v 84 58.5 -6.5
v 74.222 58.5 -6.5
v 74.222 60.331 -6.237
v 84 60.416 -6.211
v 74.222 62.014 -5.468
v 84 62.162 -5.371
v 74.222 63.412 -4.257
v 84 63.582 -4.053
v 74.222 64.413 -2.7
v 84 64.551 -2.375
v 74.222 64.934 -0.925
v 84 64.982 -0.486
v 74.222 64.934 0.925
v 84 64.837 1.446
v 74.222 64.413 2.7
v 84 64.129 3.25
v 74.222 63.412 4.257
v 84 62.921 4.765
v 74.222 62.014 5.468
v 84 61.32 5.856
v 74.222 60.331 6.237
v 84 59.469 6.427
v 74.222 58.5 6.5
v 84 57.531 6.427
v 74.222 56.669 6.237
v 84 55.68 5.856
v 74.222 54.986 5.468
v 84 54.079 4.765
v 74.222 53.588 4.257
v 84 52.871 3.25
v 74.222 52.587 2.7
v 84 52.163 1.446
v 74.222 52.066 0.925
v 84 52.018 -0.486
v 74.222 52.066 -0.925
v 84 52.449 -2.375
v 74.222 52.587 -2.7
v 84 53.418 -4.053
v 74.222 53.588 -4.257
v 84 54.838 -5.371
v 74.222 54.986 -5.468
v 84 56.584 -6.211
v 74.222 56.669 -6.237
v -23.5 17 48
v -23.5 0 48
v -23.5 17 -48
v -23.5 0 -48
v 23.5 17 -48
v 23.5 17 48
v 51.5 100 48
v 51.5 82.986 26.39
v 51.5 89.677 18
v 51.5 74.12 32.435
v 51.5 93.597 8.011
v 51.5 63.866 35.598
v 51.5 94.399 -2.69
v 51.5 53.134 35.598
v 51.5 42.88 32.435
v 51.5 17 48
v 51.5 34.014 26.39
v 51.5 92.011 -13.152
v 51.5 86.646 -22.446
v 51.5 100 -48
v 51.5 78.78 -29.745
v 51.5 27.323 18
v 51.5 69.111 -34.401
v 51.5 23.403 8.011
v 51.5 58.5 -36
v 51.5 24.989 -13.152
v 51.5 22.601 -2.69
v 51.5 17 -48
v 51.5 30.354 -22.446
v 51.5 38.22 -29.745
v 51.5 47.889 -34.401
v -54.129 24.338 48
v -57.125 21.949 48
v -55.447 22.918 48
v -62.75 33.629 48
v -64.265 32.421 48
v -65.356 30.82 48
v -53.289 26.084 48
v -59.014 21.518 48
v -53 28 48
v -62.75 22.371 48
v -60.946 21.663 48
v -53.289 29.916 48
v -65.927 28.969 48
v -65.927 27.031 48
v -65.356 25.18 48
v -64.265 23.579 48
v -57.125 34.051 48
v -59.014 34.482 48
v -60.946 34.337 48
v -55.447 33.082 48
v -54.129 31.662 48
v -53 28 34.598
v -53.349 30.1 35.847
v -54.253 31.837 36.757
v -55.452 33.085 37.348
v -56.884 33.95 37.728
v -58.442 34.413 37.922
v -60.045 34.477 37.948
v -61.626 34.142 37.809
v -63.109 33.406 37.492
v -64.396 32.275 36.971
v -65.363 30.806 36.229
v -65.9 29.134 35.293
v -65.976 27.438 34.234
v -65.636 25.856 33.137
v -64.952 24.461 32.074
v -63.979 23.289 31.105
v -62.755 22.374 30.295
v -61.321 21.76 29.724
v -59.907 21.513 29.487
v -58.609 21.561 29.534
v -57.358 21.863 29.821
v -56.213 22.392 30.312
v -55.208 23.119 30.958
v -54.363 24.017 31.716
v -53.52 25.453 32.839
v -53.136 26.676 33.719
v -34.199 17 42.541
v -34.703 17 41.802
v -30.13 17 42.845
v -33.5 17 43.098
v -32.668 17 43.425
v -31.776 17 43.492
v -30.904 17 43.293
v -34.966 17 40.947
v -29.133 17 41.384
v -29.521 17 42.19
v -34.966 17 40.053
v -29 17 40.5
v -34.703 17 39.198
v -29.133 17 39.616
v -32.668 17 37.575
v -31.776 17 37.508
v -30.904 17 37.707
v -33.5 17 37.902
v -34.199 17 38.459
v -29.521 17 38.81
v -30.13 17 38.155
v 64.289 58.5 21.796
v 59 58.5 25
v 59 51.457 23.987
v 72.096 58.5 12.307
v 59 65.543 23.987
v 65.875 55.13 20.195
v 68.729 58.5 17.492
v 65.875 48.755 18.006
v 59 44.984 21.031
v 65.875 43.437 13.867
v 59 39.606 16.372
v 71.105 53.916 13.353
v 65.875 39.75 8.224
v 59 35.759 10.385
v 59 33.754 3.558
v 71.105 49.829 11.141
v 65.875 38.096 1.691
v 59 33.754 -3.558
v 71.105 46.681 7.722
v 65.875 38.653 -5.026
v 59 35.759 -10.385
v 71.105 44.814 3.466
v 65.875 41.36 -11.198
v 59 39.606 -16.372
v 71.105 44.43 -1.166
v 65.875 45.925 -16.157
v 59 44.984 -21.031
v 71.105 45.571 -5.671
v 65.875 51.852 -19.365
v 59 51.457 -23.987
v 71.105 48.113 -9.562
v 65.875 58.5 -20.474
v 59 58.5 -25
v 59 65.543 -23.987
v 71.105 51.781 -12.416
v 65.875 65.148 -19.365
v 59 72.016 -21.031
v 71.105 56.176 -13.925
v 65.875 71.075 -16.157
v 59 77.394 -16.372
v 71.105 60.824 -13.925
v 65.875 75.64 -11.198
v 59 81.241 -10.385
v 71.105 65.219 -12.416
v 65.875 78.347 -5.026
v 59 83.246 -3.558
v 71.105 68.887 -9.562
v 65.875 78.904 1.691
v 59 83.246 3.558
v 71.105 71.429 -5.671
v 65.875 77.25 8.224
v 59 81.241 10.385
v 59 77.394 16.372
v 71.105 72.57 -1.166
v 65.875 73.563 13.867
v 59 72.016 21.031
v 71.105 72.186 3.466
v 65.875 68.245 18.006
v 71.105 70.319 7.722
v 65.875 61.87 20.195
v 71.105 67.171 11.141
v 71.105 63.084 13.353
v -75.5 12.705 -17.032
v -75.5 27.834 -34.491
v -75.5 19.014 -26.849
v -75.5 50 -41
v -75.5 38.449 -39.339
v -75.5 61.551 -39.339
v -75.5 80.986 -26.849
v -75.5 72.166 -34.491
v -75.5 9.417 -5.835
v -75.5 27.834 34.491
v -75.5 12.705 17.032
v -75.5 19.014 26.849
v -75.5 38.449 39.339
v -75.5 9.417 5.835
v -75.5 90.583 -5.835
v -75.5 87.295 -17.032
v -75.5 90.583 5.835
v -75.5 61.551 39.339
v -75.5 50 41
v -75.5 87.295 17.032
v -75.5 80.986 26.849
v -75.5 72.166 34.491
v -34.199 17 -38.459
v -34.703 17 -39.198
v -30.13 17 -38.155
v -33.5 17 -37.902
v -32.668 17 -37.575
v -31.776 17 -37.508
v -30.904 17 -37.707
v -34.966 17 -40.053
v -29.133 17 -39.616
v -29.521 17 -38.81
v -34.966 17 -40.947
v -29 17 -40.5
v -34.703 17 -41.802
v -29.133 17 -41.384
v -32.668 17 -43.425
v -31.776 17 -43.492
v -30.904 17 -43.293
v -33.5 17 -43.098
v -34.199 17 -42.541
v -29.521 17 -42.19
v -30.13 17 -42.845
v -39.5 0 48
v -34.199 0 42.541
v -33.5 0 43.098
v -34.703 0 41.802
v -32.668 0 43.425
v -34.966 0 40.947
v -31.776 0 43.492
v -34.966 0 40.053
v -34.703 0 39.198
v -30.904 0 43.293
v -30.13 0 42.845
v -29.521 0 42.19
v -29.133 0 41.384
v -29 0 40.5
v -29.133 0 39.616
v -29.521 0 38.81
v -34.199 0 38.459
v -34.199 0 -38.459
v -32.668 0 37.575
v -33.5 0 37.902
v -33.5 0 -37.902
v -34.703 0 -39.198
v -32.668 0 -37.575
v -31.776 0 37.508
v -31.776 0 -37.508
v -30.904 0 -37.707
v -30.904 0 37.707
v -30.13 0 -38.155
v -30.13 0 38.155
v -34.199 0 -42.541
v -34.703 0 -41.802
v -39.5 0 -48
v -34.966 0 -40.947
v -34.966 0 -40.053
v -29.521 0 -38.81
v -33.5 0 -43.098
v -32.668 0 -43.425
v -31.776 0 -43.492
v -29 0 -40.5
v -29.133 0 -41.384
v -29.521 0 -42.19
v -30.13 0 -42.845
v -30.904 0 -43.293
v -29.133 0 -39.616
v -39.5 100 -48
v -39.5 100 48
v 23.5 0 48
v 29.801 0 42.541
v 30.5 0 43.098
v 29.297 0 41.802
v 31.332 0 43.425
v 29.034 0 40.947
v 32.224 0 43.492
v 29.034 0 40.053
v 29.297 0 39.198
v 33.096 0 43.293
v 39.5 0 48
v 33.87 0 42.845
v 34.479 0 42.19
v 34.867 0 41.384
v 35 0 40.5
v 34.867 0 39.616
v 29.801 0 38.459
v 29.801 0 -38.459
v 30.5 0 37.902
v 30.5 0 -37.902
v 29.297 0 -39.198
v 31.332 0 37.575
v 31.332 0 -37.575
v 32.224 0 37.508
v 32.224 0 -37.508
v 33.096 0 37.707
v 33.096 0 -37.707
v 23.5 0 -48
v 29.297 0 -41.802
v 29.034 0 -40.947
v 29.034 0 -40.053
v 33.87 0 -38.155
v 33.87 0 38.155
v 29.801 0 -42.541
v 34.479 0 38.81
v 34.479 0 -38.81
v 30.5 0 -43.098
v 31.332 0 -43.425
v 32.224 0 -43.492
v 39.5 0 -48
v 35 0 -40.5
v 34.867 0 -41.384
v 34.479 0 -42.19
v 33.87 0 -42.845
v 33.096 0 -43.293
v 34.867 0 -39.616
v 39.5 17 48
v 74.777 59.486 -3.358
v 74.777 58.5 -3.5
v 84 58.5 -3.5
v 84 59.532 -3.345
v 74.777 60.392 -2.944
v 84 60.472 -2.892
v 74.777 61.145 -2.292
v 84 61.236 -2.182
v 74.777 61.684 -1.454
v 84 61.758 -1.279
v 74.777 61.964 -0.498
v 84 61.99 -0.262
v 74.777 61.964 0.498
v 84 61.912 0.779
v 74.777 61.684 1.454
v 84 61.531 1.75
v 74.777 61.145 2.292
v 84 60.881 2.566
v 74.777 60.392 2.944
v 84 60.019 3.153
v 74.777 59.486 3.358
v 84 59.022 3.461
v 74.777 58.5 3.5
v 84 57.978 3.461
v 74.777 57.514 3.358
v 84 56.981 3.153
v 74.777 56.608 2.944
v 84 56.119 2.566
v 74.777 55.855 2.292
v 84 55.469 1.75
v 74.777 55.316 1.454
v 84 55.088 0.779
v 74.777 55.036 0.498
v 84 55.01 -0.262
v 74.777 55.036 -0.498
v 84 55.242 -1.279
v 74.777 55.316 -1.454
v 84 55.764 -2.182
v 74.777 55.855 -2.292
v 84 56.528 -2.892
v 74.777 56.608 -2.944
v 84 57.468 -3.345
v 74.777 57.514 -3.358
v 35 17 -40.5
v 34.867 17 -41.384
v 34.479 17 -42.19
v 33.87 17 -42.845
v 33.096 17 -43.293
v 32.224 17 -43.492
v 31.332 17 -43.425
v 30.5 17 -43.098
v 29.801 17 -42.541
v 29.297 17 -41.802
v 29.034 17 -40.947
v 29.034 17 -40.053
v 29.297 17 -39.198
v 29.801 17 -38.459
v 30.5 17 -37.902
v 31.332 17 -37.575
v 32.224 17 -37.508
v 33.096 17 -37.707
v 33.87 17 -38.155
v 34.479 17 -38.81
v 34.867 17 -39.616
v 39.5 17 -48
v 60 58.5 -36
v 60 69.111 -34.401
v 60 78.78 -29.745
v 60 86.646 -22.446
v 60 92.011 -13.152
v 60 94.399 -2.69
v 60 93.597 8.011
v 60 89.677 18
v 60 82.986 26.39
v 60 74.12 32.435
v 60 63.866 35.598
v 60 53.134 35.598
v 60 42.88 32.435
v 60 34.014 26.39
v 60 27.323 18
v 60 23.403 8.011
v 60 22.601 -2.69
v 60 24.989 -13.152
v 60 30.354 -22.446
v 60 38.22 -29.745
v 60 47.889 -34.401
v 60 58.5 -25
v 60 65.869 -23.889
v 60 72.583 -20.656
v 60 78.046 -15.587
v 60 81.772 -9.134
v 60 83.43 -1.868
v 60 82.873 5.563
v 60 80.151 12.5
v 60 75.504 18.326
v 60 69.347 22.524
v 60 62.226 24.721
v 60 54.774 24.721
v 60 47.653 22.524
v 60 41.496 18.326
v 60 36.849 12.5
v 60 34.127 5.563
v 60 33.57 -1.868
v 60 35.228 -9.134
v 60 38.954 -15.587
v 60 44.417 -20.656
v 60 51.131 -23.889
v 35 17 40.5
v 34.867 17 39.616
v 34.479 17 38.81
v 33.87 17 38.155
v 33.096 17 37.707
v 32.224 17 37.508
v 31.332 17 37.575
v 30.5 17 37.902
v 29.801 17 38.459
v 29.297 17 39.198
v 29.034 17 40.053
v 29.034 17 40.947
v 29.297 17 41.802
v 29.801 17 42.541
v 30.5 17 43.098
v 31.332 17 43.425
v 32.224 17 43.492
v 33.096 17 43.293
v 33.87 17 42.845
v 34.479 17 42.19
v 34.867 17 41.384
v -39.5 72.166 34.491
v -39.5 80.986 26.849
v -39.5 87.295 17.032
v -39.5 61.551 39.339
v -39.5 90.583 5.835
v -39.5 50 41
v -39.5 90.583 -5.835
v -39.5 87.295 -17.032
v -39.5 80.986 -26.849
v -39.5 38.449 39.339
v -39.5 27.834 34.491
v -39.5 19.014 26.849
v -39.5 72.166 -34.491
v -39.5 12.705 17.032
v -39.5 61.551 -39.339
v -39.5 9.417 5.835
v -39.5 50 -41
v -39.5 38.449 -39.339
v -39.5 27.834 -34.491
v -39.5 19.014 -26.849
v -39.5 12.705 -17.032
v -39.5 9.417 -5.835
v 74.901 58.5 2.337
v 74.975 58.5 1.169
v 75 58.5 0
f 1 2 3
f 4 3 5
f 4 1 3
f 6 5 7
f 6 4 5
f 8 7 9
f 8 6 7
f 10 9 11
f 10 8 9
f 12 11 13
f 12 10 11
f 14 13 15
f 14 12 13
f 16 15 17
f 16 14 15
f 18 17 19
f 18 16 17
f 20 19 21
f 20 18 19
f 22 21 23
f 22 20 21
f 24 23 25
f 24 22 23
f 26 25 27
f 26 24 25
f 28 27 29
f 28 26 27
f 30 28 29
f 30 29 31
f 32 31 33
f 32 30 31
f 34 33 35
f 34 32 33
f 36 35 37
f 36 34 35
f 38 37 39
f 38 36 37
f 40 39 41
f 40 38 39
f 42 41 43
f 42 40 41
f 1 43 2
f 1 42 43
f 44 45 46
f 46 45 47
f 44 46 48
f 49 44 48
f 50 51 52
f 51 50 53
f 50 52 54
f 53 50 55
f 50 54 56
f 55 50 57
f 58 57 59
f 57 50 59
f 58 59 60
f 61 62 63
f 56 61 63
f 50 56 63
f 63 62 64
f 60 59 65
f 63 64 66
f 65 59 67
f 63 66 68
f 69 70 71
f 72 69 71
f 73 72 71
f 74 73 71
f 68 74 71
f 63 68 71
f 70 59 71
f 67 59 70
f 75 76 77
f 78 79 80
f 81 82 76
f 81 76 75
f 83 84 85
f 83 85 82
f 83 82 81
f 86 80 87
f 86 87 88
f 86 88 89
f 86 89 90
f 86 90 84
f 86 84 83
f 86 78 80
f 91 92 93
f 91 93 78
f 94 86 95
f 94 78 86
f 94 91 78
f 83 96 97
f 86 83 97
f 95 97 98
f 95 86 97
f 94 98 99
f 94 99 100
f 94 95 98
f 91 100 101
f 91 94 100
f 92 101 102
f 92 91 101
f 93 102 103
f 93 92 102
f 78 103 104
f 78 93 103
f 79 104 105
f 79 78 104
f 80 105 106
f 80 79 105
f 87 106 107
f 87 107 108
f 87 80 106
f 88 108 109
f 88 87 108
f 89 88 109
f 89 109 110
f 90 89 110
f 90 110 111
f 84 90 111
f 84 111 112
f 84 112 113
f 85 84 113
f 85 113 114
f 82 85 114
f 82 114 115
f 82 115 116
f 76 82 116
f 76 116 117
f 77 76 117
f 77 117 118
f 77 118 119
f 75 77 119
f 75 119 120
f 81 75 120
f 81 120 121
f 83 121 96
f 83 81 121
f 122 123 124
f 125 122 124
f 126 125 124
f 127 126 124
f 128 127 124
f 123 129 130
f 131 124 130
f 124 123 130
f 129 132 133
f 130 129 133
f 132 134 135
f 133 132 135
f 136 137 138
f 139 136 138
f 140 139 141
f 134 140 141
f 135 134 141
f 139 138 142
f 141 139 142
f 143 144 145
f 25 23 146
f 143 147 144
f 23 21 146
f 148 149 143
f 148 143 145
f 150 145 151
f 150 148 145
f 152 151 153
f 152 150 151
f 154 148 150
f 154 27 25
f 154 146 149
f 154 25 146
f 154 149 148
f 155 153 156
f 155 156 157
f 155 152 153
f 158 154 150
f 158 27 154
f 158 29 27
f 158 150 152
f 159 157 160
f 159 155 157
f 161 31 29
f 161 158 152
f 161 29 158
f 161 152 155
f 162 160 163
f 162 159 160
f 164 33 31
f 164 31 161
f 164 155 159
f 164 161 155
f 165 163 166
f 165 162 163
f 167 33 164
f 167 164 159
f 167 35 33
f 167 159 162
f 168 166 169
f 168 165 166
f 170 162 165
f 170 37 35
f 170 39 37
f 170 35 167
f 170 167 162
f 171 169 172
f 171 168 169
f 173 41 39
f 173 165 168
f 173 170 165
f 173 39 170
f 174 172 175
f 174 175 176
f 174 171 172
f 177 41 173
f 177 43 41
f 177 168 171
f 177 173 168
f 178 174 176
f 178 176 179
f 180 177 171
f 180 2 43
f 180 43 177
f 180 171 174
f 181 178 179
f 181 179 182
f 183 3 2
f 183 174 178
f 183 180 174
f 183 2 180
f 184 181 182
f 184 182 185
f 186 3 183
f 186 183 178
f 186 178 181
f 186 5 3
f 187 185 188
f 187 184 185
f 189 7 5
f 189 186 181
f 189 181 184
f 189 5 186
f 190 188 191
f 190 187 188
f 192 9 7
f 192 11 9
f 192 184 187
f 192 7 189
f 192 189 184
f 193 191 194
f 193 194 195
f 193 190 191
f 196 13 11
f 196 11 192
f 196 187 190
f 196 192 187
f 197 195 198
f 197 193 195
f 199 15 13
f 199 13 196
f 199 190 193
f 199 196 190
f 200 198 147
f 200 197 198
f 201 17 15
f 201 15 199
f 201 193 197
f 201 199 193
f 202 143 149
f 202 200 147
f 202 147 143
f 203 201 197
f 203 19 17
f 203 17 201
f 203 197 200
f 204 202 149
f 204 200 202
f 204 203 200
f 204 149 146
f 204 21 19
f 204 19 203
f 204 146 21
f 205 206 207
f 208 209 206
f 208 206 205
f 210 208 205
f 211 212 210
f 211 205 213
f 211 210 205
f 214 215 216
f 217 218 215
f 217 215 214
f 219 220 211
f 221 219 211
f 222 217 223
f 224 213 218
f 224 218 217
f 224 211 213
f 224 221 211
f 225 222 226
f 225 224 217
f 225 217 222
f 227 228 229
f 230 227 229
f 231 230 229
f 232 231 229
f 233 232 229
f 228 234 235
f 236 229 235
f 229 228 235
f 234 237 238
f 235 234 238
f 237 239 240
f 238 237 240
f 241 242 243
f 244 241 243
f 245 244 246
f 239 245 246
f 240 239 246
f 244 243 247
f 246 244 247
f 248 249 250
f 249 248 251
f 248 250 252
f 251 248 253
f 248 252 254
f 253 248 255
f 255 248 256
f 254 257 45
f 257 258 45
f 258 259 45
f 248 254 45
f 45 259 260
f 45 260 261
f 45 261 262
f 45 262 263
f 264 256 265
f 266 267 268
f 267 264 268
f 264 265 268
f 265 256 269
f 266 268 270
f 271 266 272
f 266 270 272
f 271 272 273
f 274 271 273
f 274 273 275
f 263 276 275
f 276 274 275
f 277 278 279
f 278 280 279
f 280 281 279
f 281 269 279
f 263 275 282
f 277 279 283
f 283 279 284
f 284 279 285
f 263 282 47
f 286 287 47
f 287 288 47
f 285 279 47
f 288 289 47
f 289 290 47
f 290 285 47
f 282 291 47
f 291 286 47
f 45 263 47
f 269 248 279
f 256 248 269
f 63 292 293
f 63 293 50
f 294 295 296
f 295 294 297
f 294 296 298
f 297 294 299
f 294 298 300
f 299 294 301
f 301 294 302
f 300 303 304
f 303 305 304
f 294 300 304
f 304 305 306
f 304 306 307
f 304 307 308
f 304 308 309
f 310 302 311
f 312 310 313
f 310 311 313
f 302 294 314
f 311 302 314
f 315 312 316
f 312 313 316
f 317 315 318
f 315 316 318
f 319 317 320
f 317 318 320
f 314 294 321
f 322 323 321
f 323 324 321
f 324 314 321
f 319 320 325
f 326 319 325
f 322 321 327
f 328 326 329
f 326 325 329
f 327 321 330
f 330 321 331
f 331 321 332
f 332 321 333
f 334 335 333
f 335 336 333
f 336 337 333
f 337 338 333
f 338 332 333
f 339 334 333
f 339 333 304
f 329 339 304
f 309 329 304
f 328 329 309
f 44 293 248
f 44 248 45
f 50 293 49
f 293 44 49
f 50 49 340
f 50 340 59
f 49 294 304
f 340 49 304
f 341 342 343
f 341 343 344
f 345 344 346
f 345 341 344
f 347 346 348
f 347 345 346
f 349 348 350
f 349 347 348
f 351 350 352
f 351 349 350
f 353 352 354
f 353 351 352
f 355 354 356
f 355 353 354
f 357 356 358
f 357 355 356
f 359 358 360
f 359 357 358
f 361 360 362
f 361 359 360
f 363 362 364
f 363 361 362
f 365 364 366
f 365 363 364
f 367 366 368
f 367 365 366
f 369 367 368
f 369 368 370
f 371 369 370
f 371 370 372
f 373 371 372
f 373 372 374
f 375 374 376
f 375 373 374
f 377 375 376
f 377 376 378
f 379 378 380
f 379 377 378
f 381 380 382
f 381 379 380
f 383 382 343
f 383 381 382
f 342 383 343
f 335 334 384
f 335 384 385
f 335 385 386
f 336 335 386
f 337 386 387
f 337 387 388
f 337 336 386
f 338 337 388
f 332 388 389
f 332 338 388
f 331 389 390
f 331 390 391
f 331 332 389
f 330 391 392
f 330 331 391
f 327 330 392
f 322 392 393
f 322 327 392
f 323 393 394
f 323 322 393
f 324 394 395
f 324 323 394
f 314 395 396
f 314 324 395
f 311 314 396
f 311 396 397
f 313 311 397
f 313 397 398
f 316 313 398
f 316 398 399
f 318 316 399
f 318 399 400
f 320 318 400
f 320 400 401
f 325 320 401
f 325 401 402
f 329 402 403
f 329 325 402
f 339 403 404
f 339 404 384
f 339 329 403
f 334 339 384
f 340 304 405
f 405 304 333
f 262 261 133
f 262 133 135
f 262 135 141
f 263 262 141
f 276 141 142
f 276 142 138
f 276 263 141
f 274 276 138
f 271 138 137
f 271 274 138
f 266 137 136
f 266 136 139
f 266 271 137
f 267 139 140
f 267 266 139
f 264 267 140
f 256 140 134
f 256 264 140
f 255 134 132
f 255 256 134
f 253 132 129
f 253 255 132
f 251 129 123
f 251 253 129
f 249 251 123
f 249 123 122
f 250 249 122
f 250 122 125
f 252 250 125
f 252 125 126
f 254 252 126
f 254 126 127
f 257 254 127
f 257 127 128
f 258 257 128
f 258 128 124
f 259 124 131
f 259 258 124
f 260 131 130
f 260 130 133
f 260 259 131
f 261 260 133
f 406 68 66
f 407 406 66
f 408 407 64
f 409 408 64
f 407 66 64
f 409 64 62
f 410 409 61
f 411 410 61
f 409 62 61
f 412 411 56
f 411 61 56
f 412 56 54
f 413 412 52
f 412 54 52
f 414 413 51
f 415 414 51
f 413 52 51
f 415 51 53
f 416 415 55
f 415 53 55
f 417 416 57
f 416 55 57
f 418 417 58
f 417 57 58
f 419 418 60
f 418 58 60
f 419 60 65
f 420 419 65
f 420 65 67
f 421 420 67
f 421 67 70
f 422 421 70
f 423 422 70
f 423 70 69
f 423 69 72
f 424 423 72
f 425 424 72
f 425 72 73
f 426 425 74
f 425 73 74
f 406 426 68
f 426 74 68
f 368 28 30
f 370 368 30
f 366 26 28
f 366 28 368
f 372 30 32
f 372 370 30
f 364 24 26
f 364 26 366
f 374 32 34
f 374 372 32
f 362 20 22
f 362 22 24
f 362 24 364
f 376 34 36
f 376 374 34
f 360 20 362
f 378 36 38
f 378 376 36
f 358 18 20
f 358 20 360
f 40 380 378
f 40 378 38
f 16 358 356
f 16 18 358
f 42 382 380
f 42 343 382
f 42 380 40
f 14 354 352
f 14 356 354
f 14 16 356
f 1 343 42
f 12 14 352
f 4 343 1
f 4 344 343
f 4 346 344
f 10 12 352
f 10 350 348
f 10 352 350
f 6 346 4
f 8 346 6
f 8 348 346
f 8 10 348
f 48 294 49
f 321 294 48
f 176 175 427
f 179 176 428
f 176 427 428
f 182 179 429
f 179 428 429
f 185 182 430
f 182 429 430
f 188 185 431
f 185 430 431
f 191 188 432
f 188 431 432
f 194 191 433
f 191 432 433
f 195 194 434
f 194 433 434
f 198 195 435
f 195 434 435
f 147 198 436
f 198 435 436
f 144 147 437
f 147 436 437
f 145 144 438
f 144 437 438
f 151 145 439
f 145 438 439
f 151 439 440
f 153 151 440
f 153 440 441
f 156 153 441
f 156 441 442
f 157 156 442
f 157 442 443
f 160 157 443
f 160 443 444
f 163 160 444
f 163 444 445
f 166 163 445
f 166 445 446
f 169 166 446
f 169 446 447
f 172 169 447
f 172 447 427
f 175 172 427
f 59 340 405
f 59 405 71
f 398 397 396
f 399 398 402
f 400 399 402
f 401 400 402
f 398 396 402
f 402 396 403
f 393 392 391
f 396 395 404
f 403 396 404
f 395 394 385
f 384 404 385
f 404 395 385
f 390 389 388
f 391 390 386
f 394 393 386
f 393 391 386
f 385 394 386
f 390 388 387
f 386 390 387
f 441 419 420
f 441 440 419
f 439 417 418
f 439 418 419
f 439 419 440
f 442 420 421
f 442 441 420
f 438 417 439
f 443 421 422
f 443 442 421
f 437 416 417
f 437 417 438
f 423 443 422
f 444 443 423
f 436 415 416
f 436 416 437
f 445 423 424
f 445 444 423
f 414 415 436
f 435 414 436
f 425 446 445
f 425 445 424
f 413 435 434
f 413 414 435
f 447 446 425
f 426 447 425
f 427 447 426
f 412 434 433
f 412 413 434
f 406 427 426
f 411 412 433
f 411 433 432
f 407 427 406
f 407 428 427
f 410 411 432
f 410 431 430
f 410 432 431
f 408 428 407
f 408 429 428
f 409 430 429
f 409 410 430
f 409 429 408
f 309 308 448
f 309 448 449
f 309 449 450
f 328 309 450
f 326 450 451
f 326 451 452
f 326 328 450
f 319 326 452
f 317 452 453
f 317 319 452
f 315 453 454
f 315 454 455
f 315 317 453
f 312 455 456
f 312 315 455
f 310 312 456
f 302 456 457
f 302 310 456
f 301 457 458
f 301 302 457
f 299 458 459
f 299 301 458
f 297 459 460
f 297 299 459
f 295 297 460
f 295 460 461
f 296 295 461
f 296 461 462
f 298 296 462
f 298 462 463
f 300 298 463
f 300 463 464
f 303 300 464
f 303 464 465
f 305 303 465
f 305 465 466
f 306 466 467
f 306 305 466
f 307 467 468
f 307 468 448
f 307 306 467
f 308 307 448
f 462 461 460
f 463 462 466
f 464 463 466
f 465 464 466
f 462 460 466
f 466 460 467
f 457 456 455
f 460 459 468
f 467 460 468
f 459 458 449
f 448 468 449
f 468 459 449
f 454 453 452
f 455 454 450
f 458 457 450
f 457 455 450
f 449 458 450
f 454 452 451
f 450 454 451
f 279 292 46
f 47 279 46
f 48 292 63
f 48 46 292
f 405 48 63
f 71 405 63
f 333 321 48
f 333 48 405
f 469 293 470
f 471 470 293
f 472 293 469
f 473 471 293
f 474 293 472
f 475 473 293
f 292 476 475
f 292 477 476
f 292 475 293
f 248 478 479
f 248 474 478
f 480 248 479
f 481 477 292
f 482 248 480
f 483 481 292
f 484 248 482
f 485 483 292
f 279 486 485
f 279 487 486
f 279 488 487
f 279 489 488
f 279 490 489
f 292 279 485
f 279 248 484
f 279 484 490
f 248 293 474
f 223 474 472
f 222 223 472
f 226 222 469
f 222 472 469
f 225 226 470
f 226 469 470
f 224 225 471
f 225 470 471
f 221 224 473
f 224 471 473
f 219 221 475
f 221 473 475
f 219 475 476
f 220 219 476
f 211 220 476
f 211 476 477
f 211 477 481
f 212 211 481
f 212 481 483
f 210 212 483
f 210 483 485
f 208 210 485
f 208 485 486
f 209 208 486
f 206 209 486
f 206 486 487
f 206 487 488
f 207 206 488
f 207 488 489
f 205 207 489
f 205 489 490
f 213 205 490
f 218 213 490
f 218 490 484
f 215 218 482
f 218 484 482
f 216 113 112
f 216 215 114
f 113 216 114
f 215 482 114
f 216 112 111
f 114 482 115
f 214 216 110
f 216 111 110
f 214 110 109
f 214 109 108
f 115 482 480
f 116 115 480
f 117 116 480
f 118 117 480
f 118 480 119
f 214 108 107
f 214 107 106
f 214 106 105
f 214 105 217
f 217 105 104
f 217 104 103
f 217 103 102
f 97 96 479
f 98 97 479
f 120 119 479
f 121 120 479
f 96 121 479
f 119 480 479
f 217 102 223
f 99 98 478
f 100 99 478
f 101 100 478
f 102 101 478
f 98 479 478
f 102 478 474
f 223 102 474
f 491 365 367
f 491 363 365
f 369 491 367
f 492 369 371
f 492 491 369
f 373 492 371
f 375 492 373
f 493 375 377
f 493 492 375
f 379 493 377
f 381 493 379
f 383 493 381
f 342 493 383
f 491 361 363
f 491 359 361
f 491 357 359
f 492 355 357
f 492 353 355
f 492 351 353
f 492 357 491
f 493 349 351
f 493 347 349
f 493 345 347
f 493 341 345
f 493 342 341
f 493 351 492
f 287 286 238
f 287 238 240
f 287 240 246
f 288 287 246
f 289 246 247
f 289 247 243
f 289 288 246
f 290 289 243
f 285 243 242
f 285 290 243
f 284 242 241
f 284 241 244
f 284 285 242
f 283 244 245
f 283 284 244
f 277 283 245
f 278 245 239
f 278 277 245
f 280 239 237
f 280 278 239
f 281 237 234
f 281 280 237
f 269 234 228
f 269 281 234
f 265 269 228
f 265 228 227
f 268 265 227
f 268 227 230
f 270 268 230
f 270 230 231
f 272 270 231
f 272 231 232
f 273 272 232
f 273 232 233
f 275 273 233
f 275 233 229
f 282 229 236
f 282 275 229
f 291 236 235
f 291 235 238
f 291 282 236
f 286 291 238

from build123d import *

# Parameters (mm, degrees)
SKETCH1_W             = 16
SKETCH1_H             = 96
SKETCH1_R             = 3
BOSS_EXTRUDE1_DEPTH   = 17
BOSS_EXTRUDE1_2_DEPTH = 17
SKETCH2_W             = 91
SKETCH2_H             = 96
BOSS_EXTRUDE2_DEPTH   = 83
SKETCH3_R             = 41
BOSS_EXTRUDE3_DEPTH   = 36
BOSS_EXTRUDE4_REACH   = 98
SKETCH4_R             = 6.5
SKETCH5_R             = 36
BOSS_EXTRUDE5_DEPTH   = 8.5
SKETCH6_R             = 25
CUT_EXTRUDE1_DEPTH    = 1
DOME1_FACE_RADIUS     = 25
DOME1_HEIGHT          = 16
SKETCH7_R             = 6.5
SKETCH7_R_2           = 3.5
BOSS_EXTRUDE6_DEPTH   = 9


with BuildPart() as part:
    # Sketch1 → Boss-Extrude1 (new body)
    with BuildSketch(Plane(origin=(0, 0, 0), x_dir=(1, 0, 0), z_dir=(0, 1, 0))):
        with Locations((-31.5, 0)):
            Rectangle(SKETCH1_W, SKETCH1_H)
        with Locations((-32, 40.5)):
            Circle(SKETCH1_R, mode=Mode.SUBTRACT)
        with Locations((-32, -40.5)):
            Circle(SKETCH1_R, mode=Mode.SUBTRACT)
    extrude(amount=BOSS_EXTRUDE1_DEPTH)



with BuildPart() as body_2:
    # Sketch1 → Boss-Extrude1 2 (new body)
    with BuildSketch(Plane(origin=(0, 0, 0), x_dir=(1, 0, 0), z_dir=(0, 1, 0))):
        with Locations((31.5, 0)):
            Rectangle(SKETCH1_W, SKETCH1_H)
        with Locations((32, 40.5)):
            Circle(SKETCH1_R, mode=Mode.SUBTRACT)
        with Locations((32, -40.5)):
            Circle(SKETCH1_R, mode=Mode.SUBTRACT)
    extrude(amount=BOSS_EXTRUDE1_2_DEPTH)


with BuildPart() as part_1:
    add(part.part)

    add(body_2.part)  # Boss-Extrude2 merges body 2
    # Sketch2 → Boss-Extrude2 (add)
    with BuildSketch(Plane(origin=(0, 17, 0), x_dir=(1, 0, 0), z_dir=(0, 1, 0))):
        with Locations((6, 0)):
            Rectangle(SKETCH2_W, SKETCH2_H)
    extrude(amount=BOSS_EXTRUDE2_DEPTH)

    # Sketch3 → Boss-Extrude3 (add)
    with BuildSketch(Plane.ZY.offset(39.5)):
        with Locations((0, 50)):
            Circle(SKETCH3_R)
    extrude(amount=BOSS_EXTRUDE3_DEPTH)

    # Sketch4 → Boss-Extrude4 (add, up to next)
    with BuildSketch(Plane.XY.offset(48), mode=Mode.PRIVATE) as boss_extrude4_sk1:
        with Locations((-59.5, 28)):
            Circle(SKETCH4_R)
    boss_extrude4_tool1 = extrude(boss_extrude4_sk1.sketch, amount=-BOSS_EXTRUDE4_REACH, mode=Mode.PRIVATE) - part_1.part
    add(boss_extrude4_tool1.solids().sort_by_distance((-59.5, 28, 48))[0])

    # Sketch5 → Boss-Extrude5 (add)
    with BuildSketch(Plane(origin=(51.5, 0, 0), x_dir=(0, 0, -1), z_dir=(1, 0, 0))):
        with Locations((0, 58.5)):
            Circle(SKETCH5_R)
    extrude(amount=BOSS_EXTRUDE5_DEPTH)

    # Sketch6 → Cut-Extrude1 (cut)
    with BuildSketch(Plane(origin=(60, 0, 0), x_dir=(0, 0, -1), z_dir=(1, 0, 0))):
        with Locations((0, 58.5)):
            Circle(SKETCH6_R)
    extrude(amount=-CUT_EXTRUDE1_DEPTH, mode=Mode.SUBTRACT)

    # Dome1: a dome of height H over a round flat face of radius A is a cap of a sphere of radius (A * A + H * H) / (2 * H)
    dome1_r = (DOME1_FACE_RADIUS * DOME1_FACE_RADIUS + DOME1_HEIGHT * DOME1_HEIGHT) / (2 * DOME1_HEIGHT)
    dome1_base = Plane((59, 58.5, 0), z_dir=(1, 0, 0))
    with Locations(dome1_base.offset(DOME1_HEIGHT - dome1_r)):
        dome1_ball = Sphere(dome1_r, mode=Mode.PRIVATE)
    add(split(dome1_ball, bisect_by=dome1_base, keep=Keep.TOP, mode=Mode.PRIVATE))

    # Sketch7 → Boss-Extrude6 (add, symmetric)
    with BuildSketch(Plane(origin=(75, 0, 0), x_dir=(0, 0, -1), z_dir=(1, 0, 0))):
        with Locations((0, 58.5)):
            Circle(SKETCH7_R)
        with Locations((0, 58.5)):
            Circle(SKETCH7_R_2, mode=Mode.SUBTRACT)
    extrude(amount=BOSS_EXTRUDE6_DEPTH, both=True)


solid = part_1.part
